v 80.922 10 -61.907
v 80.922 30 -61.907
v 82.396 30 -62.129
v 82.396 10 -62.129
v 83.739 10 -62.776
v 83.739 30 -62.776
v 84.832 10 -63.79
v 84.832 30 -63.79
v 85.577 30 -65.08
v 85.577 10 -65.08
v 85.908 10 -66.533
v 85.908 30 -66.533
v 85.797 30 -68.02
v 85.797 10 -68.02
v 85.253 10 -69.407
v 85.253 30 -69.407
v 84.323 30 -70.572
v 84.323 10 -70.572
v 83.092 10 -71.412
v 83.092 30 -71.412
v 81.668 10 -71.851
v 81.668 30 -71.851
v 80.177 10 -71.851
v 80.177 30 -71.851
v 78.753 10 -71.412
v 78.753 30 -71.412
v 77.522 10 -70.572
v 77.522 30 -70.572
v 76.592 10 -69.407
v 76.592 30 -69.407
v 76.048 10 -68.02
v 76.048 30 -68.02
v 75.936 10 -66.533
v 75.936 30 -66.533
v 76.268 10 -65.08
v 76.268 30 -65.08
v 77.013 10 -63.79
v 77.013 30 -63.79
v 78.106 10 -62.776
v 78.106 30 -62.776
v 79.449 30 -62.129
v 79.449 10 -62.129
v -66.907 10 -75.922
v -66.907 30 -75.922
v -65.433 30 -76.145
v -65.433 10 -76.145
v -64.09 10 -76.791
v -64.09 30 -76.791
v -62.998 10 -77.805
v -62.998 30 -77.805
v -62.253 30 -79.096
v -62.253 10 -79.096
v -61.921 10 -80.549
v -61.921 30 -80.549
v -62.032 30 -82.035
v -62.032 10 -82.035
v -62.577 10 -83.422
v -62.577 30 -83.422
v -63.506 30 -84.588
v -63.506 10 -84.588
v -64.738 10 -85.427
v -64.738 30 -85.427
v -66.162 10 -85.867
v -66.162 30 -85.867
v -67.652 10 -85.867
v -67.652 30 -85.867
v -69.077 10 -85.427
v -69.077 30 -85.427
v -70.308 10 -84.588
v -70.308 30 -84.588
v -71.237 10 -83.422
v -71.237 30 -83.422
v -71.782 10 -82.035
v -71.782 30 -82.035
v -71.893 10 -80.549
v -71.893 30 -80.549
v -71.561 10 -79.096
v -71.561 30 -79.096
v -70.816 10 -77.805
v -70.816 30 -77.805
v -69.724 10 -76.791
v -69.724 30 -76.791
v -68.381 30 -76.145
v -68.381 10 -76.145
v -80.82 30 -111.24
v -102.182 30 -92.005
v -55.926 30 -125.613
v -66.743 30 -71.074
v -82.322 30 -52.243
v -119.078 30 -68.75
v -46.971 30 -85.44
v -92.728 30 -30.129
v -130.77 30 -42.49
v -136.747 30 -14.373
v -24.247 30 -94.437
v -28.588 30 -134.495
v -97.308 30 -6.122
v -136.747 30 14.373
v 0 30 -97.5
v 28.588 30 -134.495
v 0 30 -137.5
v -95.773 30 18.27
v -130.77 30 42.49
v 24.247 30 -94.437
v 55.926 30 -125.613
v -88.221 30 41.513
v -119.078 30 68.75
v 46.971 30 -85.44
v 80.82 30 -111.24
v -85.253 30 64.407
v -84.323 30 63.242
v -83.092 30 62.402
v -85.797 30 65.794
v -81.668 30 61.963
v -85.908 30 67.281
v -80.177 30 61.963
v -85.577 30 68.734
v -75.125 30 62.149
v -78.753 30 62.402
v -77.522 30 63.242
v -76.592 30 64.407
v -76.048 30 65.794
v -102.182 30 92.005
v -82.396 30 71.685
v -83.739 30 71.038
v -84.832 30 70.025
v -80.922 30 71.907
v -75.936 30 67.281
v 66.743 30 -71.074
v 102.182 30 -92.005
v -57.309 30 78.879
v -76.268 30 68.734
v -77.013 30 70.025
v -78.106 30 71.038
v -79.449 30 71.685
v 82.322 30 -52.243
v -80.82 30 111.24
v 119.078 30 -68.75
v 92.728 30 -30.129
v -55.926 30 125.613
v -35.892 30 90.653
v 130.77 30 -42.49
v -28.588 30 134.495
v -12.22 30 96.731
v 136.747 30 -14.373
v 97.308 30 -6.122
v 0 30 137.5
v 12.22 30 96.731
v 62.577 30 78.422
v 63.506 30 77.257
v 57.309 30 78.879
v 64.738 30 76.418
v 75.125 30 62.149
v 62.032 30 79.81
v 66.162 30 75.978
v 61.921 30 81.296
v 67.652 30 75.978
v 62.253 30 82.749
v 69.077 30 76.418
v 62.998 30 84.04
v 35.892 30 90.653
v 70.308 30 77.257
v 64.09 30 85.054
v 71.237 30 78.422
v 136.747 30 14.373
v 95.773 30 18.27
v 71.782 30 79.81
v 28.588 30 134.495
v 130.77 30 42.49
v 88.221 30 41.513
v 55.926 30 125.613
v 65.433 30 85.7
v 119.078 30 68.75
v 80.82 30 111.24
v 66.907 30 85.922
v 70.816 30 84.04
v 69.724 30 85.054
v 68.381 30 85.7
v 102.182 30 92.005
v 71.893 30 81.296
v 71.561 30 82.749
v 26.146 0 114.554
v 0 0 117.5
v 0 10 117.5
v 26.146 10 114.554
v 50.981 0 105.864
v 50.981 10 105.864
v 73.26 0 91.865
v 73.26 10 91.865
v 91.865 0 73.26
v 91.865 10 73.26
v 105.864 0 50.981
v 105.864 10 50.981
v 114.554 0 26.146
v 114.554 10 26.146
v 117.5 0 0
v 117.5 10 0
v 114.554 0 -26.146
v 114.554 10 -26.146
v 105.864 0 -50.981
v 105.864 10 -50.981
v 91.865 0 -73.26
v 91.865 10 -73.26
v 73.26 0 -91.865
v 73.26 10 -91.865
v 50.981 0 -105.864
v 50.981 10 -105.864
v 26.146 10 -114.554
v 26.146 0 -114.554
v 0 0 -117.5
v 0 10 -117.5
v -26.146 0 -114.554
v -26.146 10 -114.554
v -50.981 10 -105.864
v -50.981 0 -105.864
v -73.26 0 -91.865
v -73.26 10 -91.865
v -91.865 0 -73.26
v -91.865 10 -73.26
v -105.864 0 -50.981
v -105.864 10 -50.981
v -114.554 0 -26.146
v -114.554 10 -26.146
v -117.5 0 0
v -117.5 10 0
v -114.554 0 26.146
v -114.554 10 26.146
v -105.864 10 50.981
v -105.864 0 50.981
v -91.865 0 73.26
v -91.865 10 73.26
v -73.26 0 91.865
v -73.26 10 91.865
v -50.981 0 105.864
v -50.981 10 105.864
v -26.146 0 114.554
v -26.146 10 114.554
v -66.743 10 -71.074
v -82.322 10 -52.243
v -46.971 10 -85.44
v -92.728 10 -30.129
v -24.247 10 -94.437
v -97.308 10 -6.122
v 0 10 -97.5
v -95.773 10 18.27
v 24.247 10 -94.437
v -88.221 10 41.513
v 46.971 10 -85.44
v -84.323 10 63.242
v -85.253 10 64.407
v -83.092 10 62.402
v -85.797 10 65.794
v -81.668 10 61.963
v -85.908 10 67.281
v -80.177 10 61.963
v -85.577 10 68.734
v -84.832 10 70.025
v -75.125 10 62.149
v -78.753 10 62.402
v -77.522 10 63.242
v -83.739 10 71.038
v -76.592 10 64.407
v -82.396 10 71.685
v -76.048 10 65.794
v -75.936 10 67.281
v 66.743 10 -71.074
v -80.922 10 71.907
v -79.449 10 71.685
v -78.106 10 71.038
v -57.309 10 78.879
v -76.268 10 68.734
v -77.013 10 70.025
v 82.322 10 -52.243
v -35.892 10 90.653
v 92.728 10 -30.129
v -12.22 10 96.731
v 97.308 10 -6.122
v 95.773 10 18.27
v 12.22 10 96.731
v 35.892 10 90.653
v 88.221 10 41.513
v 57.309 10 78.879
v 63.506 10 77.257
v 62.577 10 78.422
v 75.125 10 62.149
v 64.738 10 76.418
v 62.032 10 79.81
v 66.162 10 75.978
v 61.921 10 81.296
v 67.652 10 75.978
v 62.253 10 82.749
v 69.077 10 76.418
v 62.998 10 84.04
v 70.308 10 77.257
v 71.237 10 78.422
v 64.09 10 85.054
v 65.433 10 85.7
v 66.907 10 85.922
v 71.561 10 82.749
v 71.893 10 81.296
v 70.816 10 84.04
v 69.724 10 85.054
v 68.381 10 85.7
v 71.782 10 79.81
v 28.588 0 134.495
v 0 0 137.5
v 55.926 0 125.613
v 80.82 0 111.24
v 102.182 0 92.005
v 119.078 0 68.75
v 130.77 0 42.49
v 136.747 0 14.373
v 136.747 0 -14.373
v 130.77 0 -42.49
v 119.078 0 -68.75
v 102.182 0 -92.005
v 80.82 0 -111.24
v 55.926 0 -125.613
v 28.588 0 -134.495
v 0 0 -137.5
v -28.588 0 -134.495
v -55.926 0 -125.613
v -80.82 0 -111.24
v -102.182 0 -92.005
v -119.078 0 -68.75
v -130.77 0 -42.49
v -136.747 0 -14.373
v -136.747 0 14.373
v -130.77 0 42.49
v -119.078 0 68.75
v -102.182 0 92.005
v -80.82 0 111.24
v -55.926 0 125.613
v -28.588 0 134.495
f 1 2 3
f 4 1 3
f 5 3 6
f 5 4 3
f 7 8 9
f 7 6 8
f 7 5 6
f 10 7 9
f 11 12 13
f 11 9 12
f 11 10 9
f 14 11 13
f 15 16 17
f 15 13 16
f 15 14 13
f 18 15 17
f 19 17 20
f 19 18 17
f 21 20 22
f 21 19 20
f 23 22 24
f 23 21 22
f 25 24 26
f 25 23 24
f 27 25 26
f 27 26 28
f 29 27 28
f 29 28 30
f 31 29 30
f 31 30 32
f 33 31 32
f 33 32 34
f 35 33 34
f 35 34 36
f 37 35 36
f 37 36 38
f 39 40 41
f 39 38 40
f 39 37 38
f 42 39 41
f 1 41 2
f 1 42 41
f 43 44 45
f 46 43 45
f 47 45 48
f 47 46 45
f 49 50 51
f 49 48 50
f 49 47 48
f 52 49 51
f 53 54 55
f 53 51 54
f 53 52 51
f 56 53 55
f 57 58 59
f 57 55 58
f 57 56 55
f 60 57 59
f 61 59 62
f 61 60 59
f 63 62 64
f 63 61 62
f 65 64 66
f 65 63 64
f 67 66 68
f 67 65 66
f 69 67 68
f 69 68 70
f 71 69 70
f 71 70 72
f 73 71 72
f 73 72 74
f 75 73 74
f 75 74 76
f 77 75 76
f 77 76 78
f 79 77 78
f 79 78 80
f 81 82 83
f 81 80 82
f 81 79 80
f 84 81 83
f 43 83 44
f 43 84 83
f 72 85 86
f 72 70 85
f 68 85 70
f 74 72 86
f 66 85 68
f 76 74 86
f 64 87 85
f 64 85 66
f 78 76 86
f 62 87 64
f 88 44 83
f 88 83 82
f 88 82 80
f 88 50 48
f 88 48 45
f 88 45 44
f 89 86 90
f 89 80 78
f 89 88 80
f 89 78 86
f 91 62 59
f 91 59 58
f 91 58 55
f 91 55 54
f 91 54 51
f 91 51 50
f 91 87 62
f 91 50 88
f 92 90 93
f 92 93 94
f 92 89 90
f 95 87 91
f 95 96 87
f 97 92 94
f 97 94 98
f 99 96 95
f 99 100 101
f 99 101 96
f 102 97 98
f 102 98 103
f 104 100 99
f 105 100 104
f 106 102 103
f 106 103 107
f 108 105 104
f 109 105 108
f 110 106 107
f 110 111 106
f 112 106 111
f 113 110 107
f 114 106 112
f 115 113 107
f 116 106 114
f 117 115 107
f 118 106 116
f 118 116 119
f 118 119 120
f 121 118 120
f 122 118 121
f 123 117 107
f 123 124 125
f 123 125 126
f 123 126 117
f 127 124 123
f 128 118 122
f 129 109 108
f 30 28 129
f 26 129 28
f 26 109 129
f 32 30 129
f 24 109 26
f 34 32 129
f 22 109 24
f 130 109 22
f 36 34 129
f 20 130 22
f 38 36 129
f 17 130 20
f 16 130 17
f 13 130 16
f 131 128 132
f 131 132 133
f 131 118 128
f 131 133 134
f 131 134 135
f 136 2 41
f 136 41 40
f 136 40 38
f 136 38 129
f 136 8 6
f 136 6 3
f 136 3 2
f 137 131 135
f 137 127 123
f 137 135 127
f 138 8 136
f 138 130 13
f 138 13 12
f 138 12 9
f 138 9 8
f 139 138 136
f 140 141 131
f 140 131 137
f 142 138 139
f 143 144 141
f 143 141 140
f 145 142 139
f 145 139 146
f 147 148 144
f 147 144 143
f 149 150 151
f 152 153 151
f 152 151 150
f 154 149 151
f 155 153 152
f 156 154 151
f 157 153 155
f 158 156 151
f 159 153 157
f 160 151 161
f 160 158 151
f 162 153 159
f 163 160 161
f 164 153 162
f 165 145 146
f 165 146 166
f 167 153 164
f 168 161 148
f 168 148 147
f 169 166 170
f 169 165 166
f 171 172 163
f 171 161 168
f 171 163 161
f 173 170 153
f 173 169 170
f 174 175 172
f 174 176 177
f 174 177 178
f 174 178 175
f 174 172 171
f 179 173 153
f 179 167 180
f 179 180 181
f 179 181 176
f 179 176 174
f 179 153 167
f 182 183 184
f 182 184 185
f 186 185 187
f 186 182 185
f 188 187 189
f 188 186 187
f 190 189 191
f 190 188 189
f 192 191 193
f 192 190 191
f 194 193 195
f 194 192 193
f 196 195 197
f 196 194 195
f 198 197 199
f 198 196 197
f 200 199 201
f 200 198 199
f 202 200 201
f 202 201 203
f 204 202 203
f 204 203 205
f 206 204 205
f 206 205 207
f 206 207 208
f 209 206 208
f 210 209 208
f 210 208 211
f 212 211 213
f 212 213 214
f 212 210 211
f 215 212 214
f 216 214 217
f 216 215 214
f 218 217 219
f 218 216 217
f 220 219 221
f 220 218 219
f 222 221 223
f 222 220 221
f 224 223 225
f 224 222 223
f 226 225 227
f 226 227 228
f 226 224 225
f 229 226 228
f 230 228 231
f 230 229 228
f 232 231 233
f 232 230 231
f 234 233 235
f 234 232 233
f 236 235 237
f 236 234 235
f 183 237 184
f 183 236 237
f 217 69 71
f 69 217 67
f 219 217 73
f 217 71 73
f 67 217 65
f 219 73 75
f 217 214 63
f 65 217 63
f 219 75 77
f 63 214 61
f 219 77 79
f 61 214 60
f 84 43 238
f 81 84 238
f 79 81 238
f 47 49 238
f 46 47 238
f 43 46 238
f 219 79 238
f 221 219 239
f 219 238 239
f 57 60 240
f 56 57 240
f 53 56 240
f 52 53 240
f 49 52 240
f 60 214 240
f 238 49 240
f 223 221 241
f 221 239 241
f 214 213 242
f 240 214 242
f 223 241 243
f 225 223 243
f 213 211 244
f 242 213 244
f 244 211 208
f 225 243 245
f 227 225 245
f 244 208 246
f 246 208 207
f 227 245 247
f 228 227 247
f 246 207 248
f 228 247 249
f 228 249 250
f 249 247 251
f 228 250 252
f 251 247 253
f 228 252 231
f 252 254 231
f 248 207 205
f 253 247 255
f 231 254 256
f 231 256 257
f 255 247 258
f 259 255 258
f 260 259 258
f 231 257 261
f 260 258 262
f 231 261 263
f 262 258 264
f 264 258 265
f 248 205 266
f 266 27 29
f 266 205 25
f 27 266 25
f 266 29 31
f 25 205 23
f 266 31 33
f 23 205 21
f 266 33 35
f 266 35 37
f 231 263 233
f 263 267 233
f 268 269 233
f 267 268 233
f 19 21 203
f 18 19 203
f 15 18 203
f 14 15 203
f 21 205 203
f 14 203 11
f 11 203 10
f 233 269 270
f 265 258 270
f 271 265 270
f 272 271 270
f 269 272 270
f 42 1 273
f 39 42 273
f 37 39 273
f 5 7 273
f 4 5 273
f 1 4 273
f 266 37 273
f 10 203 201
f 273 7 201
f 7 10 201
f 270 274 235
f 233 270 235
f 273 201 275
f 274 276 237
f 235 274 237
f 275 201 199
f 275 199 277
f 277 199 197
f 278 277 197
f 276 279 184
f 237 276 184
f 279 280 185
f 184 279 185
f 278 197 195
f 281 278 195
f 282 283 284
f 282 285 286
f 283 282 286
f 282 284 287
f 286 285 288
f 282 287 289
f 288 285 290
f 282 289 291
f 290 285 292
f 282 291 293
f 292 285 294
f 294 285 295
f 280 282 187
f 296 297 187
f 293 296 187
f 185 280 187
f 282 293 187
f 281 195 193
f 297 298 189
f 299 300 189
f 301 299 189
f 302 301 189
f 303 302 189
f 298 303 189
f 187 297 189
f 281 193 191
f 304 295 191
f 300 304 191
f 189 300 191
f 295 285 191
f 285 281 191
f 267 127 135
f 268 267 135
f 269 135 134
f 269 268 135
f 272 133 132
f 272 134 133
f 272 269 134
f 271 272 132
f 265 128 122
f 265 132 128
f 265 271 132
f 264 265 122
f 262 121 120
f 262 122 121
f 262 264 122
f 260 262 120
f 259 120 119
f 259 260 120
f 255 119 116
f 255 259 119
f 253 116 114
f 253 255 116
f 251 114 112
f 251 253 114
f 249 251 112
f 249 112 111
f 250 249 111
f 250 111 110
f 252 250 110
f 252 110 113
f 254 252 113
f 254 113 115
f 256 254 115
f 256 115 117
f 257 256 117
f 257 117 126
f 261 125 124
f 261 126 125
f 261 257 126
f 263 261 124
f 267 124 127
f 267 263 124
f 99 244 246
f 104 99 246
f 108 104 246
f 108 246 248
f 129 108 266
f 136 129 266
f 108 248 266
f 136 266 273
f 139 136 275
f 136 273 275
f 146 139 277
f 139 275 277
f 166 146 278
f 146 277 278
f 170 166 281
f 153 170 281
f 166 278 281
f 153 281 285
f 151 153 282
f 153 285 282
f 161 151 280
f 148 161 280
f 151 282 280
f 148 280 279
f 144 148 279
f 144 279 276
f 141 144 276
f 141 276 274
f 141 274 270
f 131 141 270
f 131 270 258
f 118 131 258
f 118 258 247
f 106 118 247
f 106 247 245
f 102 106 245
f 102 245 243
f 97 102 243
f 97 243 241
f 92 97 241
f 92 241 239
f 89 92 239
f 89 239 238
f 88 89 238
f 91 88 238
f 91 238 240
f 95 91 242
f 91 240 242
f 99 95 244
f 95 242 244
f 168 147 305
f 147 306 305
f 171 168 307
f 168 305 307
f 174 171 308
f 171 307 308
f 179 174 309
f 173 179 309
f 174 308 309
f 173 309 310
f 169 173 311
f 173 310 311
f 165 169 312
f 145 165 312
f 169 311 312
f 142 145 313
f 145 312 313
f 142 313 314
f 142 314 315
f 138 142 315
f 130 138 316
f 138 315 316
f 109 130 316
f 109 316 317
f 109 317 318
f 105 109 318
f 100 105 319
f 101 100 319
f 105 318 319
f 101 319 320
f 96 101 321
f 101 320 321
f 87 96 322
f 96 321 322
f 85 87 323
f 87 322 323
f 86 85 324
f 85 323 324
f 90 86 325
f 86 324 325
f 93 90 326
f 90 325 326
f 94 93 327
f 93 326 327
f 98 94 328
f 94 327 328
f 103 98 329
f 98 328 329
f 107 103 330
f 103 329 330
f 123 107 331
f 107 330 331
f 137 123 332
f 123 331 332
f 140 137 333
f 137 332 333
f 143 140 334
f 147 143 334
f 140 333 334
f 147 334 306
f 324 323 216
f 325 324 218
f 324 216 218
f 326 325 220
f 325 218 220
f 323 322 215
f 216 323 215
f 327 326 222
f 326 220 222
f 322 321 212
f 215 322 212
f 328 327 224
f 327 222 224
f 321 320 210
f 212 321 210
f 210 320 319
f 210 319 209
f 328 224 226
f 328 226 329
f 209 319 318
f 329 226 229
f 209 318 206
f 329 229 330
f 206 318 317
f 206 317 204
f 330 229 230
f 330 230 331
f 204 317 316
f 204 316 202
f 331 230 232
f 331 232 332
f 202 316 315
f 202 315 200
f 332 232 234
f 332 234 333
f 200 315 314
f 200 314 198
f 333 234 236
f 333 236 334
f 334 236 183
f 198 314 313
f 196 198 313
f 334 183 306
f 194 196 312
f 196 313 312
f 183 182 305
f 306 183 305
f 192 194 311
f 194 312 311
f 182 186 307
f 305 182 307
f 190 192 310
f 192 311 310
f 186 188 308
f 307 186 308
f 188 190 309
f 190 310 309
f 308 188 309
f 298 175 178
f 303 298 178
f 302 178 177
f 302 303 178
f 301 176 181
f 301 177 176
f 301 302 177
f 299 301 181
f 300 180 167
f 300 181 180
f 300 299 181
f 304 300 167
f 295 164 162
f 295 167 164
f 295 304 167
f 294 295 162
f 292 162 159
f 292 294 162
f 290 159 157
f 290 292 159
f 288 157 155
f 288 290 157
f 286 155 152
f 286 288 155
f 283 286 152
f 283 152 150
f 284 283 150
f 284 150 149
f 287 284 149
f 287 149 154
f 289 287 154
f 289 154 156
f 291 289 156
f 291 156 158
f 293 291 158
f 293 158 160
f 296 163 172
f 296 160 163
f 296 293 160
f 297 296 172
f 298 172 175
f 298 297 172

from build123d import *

# Parameters (mm, degrees)
SKETCH_2_R               = 137.5
SKETCH_2_R_2             = 117.5
EXTRUDE_1_DEPTH          = 10
SKETCH_3_R               = 137.5
EXTRUDE_2_DEPTH          = 20
SKETCH_4_R               = 97.5
CUT_EXTRUDE_1_DEPTH      = 196.480178023
CUT_EXTRUDE_2_DEPTH      = 197.7549237
CUT_EXTRUDE_2_DEPTH_BACK = 197.7549237
SKETCH_6_R               = 5


with BuildPart() as part:
    # 草图2 → 凸台-拉伸1 (new body)
    with BuildSketch(Plane(origin=(0, 0, 0), x_dir=(1, 0, 0), z_dir=(0, 1, 0))):
        with Locations(Location((0, 0, 0), (0, 0, 270))):
            Circle(SKETCH_2_R)
        with Locations(Location((0, 0, 0), (0, 0, 270))):
            Circle(SKETCH_2_R_2, mode=Mode.SUBTRACT)
    extrude(amount=EXTRUDE_1_DEPTH)

    # 草图3 → 凸台-拉伸2 (add)
    with BuildSketch(Plane(origin=(0, 10, 0), x_dir=(1, 0, 0), z_dir=(0, 1, 0))):
        with Locations(Location((0, 0, 0), (0, 0, 270))):
            Circle(SKETCH_3_R)
    extrude(amount=EXTRUDE_2_DEPTH)

    # 草图4 → 切除-拉伸1 (cut, through all)
    with BuildSketch(Plane.XZ.offset(-10)):
        with Locations(Location((0, 0, 0), (0, 0, 270))):
            Circle(SKETCH_4_R)
    extrude(amount=-CUT_EXTRUDE_1_DEPTH, mode=Mode.SUBTRACT)

    # 草图6 → 切除-拉伸2 (cut, two sides: drawn at the far end of the back side and taken through both)
    with BuildSketch(Plane(origin=(0, 30, 0), x_dir=(1, 0, 0), z_dir=(0, 1, 0)).offset(-CUT_EXTRUDE_2_DEPTH_BACK)):
        with Locations(Location((80.922446863, 66.907081792, 0), (0, 0, 270))):
            Circle(SKETCH_6_R)
        with Locations(Location((66.907081793, -80.922446862, 0), (0, 0, 270))):
            Circle(SKETCH_6_R)
        with Locations(Location((-80.922446861, -66.907081792, 0), (0, 0, 270))):
            Circle(SKETCH_6_R)
        with Locations(Location((-66.907081791, 80.922446862, 0), (0, 0, 270))):
            Circle(SKETCH_6_R)
    extrude(amount=CUT_EXTRUDE_2_DEPTH + CUT_EXTRUDE_2_DEPTH_BACK, mode=Mode.SUBTRACT)


solid = part.part
